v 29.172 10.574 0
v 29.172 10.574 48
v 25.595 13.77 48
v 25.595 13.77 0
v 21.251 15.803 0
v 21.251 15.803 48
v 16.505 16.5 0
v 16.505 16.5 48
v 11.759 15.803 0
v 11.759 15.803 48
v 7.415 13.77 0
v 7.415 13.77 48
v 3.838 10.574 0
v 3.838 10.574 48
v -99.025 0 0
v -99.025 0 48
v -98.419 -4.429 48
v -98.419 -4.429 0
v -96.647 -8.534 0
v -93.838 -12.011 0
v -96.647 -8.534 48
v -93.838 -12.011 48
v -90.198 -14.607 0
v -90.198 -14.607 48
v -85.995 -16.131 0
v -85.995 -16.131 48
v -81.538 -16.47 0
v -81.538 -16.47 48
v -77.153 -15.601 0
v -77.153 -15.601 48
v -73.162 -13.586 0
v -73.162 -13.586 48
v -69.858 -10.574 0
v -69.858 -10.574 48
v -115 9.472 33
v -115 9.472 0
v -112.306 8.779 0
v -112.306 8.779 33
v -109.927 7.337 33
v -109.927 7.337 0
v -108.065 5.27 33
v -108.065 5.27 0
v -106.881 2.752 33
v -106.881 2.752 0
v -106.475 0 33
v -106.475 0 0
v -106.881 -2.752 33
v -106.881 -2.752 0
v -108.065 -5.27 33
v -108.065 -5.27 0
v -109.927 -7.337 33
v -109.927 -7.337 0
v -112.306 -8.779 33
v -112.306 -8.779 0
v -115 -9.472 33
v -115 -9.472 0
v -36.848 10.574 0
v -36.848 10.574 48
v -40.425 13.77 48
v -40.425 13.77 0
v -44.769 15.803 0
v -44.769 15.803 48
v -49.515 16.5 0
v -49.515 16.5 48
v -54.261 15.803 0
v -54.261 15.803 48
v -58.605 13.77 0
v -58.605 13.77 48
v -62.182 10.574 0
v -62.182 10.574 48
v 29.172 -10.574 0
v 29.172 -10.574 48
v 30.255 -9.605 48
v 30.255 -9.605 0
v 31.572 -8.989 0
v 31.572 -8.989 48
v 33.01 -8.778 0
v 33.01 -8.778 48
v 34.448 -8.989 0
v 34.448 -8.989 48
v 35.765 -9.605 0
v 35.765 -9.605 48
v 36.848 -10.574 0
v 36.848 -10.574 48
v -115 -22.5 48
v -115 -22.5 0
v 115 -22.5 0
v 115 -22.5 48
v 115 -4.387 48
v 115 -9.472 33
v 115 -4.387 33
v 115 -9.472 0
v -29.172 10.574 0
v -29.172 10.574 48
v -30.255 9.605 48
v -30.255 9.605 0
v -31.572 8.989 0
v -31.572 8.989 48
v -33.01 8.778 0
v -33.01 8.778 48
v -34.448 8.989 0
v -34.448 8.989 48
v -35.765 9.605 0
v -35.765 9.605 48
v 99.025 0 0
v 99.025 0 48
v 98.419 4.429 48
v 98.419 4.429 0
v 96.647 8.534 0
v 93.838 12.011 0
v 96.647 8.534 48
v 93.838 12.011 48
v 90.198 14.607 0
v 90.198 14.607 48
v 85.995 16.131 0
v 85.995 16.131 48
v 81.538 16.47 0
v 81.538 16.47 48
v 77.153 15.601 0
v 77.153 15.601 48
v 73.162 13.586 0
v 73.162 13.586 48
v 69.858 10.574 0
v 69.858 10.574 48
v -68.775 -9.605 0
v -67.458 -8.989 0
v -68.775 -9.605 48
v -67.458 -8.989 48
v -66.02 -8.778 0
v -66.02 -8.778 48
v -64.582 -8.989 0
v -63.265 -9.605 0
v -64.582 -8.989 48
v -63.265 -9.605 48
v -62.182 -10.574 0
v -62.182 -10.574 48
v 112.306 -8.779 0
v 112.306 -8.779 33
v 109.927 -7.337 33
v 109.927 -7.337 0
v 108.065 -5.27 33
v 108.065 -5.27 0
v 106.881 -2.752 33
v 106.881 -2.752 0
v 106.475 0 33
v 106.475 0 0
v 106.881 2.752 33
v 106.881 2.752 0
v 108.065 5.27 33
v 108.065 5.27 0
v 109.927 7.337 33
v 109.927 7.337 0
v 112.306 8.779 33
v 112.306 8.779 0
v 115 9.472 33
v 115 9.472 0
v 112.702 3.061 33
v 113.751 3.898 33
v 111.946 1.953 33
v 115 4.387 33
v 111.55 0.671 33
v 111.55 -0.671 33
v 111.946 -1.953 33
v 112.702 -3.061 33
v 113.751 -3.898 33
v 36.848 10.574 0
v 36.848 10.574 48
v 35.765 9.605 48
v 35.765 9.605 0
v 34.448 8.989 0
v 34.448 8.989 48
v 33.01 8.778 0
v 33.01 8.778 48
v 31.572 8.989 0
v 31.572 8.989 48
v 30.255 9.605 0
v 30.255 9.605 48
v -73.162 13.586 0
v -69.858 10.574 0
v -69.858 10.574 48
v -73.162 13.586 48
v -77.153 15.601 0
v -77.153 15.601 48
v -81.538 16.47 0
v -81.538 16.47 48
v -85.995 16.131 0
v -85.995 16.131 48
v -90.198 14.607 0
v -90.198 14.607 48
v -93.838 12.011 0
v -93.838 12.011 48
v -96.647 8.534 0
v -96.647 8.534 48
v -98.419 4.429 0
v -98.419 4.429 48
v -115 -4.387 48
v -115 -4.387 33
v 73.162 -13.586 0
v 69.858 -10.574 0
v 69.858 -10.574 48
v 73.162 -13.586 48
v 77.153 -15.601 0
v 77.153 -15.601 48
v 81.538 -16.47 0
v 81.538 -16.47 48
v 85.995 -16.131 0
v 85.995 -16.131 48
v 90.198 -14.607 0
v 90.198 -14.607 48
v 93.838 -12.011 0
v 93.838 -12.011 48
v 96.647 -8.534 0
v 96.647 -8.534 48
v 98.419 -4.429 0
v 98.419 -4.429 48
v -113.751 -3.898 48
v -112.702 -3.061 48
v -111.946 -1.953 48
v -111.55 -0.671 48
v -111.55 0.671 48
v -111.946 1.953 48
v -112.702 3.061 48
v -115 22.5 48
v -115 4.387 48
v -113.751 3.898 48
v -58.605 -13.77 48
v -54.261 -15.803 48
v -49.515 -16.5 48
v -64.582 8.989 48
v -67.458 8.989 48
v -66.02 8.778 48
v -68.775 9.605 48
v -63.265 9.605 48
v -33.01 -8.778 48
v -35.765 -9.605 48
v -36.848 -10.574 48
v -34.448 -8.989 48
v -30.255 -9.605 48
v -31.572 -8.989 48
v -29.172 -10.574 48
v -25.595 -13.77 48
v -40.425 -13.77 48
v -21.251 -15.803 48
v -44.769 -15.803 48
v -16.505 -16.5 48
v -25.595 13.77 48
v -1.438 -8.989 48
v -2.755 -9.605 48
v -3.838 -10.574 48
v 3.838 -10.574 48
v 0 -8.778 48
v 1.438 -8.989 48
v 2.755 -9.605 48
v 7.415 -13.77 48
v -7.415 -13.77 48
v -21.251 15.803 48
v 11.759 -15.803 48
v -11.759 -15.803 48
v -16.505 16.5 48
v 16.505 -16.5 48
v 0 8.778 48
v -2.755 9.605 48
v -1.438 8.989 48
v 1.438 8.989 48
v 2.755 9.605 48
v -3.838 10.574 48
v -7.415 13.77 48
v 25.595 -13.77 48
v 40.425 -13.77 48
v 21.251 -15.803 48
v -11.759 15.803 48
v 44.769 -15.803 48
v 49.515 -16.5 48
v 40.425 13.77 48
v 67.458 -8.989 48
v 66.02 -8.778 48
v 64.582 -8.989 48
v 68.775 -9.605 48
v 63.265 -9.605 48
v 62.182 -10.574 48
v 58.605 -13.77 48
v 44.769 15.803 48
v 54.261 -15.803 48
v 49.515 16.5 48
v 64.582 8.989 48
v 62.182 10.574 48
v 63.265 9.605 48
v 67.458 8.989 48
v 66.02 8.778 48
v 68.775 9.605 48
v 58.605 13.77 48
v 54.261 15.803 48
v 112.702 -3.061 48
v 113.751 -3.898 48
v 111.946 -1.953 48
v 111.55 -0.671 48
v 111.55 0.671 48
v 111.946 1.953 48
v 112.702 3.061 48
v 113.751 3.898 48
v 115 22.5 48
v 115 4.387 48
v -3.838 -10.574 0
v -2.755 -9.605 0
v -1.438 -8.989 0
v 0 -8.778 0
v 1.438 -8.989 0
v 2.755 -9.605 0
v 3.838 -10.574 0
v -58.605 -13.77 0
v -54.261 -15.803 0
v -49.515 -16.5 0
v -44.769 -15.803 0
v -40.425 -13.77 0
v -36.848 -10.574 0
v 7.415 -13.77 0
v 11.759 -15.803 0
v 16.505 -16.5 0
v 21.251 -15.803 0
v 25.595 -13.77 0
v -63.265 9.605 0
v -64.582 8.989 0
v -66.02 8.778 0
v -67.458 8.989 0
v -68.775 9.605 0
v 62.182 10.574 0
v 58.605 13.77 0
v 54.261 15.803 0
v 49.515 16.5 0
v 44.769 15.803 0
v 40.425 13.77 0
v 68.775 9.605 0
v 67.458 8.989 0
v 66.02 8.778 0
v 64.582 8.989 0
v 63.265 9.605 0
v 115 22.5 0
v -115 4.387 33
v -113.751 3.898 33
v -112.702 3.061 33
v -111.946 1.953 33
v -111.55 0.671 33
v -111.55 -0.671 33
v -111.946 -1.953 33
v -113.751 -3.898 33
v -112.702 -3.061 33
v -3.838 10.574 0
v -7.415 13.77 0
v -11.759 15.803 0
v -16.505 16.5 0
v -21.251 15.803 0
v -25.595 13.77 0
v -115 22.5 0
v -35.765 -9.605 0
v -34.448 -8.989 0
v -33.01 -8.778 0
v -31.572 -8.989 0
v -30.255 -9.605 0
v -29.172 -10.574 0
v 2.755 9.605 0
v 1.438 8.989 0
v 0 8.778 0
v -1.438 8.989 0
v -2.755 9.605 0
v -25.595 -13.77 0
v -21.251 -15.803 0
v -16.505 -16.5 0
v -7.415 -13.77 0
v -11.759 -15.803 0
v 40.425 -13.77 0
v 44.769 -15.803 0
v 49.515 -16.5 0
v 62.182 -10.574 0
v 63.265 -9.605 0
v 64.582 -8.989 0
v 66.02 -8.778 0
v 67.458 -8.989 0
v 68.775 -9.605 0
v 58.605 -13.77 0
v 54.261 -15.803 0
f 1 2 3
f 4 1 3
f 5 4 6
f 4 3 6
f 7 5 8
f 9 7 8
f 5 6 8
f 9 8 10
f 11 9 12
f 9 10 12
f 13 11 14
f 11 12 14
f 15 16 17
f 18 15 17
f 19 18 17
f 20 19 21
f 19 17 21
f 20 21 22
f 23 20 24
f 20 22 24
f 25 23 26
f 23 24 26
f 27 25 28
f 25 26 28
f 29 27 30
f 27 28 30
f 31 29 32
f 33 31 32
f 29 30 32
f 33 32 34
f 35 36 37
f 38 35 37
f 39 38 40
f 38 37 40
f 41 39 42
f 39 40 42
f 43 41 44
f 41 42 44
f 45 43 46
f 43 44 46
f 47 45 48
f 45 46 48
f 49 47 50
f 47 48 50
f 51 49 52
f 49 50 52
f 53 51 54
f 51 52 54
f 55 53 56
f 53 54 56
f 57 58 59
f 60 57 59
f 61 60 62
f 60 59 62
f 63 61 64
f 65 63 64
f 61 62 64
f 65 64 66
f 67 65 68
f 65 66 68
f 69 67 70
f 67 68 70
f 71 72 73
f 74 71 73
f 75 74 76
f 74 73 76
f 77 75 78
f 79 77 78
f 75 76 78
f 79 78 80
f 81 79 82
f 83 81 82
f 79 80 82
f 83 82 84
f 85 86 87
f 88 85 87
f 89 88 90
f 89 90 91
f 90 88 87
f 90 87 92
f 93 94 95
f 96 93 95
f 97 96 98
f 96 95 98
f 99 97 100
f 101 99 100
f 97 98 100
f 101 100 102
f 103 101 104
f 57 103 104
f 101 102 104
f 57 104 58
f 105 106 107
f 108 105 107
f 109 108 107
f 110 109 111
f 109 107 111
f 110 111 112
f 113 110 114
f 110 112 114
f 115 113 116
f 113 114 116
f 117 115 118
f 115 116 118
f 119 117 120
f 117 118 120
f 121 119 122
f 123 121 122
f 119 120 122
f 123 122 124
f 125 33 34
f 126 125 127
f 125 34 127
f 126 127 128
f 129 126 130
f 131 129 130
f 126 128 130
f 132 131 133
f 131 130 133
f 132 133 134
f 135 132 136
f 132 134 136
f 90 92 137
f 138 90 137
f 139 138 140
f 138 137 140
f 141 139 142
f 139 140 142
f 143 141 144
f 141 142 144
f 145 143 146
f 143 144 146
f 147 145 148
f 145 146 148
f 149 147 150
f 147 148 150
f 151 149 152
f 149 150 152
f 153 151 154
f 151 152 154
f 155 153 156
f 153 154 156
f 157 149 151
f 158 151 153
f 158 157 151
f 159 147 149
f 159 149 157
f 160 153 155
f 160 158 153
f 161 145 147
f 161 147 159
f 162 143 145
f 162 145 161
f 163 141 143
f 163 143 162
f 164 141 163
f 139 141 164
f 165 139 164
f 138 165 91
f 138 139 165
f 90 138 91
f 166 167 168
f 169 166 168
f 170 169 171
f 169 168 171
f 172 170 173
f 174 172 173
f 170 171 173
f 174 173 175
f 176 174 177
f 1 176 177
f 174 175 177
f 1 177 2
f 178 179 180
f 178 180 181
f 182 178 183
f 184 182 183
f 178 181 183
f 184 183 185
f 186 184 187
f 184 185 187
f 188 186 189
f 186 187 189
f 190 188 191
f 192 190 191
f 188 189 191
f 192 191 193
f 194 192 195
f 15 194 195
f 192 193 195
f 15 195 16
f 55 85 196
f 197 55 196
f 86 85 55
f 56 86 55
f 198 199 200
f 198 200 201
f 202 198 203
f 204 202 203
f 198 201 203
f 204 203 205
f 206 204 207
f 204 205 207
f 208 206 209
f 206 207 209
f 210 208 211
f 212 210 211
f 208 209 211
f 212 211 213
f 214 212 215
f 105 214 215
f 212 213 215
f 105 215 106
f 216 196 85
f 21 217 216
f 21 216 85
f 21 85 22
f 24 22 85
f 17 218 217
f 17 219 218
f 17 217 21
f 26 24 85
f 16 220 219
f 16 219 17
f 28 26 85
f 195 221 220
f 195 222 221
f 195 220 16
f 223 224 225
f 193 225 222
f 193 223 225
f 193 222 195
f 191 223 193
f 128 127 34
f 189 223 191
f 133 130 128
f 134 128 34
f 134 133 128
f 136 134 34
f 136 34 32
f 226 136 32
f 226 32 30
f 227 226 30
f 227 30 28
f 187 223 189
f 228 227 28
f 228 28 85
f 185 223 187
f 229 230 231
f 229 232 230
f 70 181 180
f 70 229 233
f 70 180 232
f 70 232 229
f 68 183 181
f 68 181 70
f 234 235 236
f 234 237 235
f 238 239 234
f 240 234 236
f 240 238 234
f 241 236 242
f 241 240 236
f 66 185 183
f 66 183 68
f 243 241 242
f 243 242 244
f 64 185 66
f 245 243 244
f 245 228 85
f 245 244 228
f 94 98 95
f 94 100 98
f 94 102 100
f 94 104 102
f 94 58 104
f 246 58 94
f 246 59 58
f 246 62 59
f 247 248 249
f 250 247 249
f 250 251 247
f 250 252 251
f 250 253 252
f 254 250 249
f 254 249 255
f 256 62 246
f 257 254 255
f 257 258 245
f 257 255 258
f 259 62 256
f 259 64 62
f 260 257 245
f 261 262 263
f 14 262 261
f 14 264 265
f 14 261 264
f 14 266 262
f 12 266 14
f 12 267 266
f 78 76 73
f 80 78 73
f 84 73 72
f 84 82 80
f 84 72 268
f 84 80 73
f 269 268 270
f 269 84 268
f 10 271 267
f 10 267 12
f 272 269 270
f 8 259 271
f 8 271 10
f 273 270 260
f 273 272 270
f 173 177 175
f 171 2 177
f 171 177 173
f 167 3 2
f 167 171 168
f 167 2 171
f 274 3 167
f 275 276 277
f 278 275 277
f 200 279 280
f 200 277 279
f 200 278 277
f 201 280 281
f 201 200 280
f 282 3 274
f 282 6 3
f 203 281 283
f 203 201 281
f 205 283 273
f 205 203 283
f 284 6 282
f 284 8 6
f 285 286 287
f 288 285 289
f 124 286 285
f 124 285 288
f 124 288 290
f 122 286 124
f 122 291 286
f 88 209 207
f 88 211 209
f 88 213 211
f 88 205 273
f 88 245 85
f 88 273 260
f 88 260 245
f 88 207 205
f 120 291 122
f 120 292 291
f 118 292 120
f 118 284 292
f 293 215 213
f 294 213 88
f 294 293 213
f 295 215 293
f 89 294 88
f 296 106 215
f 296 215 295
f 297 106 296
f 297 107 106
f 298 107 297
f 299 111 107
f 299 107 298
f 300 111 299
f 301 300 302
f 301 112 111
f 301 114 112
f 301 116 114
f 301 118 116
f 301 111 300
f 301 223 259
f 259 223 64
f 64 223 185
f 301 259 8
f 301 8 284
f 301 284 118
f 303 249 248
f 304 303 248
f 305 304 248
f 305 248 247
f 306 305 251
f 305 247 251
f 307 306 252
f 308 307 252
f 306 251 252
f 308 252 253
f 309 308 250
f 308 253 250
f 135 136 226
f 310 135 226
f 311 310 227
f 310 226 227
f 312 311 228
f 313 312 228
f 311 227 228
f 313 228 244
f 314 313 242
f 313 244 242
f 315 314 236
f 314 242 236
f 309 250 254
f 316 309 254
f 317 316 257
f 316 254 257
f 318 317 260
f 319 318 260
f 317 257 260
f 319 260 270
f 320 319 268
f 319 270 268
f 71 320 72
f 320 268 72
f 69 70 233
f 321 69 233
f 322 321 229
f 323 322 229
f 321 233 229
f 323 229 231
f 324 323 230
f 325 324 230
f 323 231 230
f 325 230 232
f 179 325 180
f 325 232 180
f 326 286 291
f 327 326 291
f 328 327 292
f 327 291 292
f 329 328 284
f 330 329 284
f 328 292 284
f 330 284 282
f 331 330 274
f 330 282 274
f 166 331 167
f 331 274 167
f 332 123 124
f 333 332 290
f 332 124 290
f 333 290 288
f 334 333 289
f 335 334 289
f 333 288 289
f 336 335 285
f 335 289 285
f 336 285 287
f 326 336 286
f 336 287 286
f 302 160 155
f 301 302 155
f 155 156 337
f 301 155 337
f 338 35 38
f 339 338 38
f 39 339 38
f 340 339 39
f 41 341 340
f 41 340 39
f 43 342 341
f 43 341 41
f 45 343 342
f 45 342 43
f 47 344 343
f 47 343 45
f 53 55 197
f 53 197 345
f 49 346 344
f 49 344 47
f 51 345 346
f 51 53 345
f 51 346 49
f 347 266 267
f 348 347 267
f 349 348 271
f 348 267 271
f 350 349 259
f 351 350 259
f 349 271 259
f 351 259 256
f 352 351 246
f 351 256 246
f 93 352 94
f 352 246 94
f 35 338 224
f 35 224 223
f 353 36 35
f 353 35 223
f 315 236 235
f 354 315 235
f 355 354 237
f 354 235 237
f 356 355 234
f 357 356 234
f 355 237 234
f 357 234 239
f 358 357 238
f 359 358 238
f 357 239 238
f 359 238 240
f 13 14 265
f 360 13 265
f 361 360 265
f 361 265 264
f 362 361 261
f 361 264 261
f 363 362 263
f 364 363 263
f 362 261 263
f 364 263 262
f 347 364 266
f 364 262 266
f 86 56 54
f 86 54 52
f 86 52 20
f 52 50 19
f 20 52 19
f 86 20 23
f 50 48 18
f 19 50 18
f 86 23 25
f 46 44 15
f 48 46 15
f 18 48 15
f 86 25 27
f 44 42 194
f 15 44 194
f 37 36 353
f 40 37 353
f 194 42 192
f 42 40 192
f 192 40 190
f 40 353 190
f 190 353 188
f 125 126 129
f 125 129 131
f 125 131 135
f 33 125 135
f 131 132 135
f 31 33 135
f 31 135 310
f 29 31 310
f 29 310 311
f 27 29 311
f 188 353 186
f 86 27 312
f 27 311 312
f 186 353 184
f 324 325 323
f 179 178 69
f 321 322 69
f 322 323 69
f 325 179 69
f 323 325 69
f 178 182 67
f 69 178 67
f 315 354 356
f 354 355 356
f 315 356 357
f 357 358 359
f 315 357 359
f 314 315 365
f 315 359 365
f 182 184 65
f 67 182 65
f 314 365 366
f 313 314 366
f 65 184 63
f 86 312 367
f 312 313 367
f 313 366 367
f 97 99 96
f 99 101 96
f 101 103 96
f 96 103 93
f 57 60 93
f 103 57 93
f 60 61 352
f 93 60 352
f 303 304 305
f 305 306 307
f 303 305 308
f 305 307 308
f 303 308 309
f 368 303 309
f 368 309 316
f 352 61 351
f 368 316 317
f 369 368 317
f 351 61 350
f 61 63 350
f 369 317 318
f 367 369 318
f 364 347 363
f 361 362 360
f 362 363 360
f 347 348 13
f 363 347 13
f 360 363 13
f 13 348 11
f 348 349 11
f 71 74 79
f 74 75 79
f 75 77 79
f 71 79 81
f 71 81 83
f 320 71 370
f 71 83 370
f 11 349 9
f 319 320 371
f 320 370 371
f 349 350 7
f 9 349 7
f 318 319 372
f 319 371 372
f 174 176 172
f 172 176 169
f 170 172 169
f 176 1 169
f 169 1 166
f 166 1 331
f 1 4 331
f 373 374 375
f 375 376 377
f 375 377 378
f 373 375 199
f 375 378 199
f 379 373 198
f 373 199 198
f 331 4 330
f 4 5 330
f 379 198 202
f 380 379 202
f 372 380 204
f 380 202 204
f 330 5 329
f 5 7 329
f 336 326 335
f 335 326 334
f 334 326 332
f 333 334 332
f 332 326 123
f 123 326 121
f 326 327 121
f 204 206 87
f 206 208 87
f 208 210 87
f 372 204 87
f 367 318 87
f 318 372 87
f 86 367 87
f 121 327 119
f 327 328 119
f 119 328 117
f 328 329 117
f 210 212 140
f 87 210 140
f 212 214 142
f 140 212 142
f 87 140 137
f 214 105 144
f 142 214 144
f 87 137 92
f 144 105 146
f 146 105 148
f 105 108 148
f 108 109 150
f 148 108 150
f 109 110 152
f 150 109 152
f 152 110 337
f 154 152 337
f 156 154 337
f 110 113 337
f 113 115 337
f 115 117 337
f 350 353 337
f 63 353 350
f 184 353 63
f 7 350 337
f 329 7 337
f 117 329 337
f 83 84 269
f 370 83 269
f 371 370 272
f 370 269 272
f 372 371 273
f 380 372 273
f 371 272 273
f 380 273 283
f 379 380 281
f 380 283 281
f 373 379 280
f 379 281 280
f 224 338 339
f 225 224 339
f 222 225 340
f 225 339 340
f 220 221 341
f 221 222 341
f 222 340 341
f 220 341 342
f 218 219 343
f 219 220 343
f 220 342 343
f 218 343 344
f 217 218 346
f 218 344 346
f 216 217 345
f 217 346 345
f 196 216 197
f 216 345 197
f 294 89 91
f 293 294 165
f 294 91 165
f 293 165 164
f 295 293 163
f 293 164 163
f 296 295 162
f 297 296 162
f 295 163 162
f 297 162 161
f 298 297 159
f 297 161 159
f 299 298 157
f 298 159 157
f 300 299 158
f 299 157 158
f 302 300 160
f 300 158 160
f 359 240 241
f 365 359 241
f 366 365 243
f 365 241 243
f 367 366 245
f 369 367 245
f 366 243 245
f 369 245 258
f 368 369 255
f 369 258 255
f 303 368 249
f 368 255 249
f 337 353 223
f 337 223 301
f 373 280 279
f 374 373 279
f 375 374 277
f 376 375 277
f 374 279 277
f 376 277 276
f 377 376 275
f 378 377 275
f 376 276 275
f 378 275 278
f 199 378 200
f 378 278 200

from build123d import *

# Parameters (mm, degrees)
F0_W     = 230
F0_H     = 45
F1_DEPTH = 48
F3_DEPTH = 48
F5_DEPTH = 33
F6_R     = 4.5
F7_DEPTH = 15


with BuildPart() as f1:
    # F0 (on Top) → F1 (new body)
    with BuildSketch(Plane.XY):
        Rectangle(F0_W, F0_H)
    extrude(amount=F1_DEPTH)

    # F2 (on face) → F3 (cut, through all)
    with BuildSketch(Plane.XY.offset(48)):
        with BuildLine():
            ThreePointArc((-69.858372, 10.573861), (-88.148639, 15.512082), (-99.025, 0))
            ThreePointArc((-99.025, 0), (-88.148639, -15.512082), (-69.858372, -10.573861))
            ThreePointArc((-69.858372, -10.573861), (-66.02, -8.778061), (-62.181628, -10.573861))
            ThreePointArc((-62.181628, -10.573861), (-49.515, -16.5), (-36.848372, -10.573861))
            ThreePointArc((-36.848372, -10.573861), (-33.01, -8.778061), (-29.171628, -10.573861))
            ThreePointArc((-29.171628, -10.573861), (-16.505, -16.5), (-3.838372, -10.573861))
            ThreePointArc((-3.838372, -10.573861), (0, -8.778061), (3.838372, -10.573861))
            ThreePointArc((3.838372, -10.573861), (16.505, -16.5), (29.171628, -10.573861))
            ThreePointArc((29.171628, -10.573861), (33.01, -8.778061), (36.848372, -10.573861))
            ThreePointArc((36.848372, -10.573861), (49.515, -16.5), (62.181628, -10.573861))
            ThreePointArc((62.181628, -10.573861), (66.02, -8.778061), (69.858372, -10.573861))
            ThreePointArc((69.858372, -10.573861), (88.148639, -15.512082), (99.025, 0))
            ThreePointArc((99.025, 0), (88.148639, 15.512082), (69.858372, 10.573861))
            ThreePointArc((69.858372, 10.573861), (66.02, 8.778061), (62.181628, 10.573861))
            ThreePointArc((62.181628, 10.573861), (49.515, 16.5), (36.848372, 10.573861))
            ThreePointArc((36.848372, 10.573861), (33.01, 8.778061), (29.171628, 10.573861))
            ThreePointArc((29.171628, 10.573861), (16.505, 16.5), (3.838372, 10.573861))
            ThreePointArc((3.838372, 10.573861), (0, 8.778061), (-3.838372, 10.573861))
            ThreePointArc((-3.838372, 10.573861), (-16.505, 16.5), (-29.171628, 10.573861))
            ThreePointArc((-29.171628, 10.573861), (-33.01, 8.778061), (-36.848372, 10.573861))
            ThreePointArc((-36.848372, 10.573861), (-49.515, 16.5), (-62.181628, 10.573861))
            ThreePointArc((-62.181628, 10.573861), (-66.02, 8.778061), (-69.858372, 10.573861))
        make_face()
    extrude(amount=-F3_DEPTH, mode=Mode.SUBTRACT)

    # F4 (on face) → F5 (cut)
    with BuildSketch(Plane(origin=(0, 0, 0), x_dir=(1, 0, 0), z_dir=(0, 0, -1))):
        with BuildLine():
            Line((-115, -9.525), (-115, -9.472361))
            ThreePointArc((-115, -9.472361), (-115.499308, -9.511831), (-116, -9.525))
            Line((-116, -9.525), (-115, -9.525))
        make_face()
        with BuildLine():
            ThreePointArc((-115, -9.472361), (-106.475, 0), (-115, 9.472361))
            Line((-115, 9.472361), (-115, -9.472361))
        make_face()
        with BuildLine():
            Line((-115, 9.525), (-116, 9.525))
            ThreePointArc((-116, 9.525), (-115.499308, 9.511831), (-115, 9.472361))
            Line((-115, 9.472361), (-115, 9.525))
        make_face()
        with BuildLine():
            ThreePointArc((115, 9.472361), (115.499308, 9.511831), (116, 9.525))
            Line((116, 9.525), (115, 9.525))
            Line((115, 9.525), (115, 9.472361))
        make_face()
        with BuildLine():
            ThreePointArc((116, -9.525), (115.499308, -9.511831), (115, -9.472361))
            Line((115, -9.472361), (115, -9.525))
            Line((115, -9.525), (116, -9.525))
        make_face()
        with BuildLine():
            Line((115, -9.472361), (115, 9.472361))
            ThreePointArc((115, 9.472361), (106.475, 0), (115, -9.472361))
        make_face()
    extrude(amount=-F5_DEPTH, mode=Mode.SUBTRACT)

    # F6 (on face) → F7 (cut, through all)
    with BuildSketch(Plane(origin=(0, 0, 33), x_dir=(1, 0, 0), z_dir=(0, 0, -1))):
        with Locations((-116, 0)):
            Circle(F6_R)
        with Locations((116, 0)):
            Circle(F6_R)
    extrude(amount=-F7_DEPTH, mode=Mode.SUBTRACT)


solid = f1.part
